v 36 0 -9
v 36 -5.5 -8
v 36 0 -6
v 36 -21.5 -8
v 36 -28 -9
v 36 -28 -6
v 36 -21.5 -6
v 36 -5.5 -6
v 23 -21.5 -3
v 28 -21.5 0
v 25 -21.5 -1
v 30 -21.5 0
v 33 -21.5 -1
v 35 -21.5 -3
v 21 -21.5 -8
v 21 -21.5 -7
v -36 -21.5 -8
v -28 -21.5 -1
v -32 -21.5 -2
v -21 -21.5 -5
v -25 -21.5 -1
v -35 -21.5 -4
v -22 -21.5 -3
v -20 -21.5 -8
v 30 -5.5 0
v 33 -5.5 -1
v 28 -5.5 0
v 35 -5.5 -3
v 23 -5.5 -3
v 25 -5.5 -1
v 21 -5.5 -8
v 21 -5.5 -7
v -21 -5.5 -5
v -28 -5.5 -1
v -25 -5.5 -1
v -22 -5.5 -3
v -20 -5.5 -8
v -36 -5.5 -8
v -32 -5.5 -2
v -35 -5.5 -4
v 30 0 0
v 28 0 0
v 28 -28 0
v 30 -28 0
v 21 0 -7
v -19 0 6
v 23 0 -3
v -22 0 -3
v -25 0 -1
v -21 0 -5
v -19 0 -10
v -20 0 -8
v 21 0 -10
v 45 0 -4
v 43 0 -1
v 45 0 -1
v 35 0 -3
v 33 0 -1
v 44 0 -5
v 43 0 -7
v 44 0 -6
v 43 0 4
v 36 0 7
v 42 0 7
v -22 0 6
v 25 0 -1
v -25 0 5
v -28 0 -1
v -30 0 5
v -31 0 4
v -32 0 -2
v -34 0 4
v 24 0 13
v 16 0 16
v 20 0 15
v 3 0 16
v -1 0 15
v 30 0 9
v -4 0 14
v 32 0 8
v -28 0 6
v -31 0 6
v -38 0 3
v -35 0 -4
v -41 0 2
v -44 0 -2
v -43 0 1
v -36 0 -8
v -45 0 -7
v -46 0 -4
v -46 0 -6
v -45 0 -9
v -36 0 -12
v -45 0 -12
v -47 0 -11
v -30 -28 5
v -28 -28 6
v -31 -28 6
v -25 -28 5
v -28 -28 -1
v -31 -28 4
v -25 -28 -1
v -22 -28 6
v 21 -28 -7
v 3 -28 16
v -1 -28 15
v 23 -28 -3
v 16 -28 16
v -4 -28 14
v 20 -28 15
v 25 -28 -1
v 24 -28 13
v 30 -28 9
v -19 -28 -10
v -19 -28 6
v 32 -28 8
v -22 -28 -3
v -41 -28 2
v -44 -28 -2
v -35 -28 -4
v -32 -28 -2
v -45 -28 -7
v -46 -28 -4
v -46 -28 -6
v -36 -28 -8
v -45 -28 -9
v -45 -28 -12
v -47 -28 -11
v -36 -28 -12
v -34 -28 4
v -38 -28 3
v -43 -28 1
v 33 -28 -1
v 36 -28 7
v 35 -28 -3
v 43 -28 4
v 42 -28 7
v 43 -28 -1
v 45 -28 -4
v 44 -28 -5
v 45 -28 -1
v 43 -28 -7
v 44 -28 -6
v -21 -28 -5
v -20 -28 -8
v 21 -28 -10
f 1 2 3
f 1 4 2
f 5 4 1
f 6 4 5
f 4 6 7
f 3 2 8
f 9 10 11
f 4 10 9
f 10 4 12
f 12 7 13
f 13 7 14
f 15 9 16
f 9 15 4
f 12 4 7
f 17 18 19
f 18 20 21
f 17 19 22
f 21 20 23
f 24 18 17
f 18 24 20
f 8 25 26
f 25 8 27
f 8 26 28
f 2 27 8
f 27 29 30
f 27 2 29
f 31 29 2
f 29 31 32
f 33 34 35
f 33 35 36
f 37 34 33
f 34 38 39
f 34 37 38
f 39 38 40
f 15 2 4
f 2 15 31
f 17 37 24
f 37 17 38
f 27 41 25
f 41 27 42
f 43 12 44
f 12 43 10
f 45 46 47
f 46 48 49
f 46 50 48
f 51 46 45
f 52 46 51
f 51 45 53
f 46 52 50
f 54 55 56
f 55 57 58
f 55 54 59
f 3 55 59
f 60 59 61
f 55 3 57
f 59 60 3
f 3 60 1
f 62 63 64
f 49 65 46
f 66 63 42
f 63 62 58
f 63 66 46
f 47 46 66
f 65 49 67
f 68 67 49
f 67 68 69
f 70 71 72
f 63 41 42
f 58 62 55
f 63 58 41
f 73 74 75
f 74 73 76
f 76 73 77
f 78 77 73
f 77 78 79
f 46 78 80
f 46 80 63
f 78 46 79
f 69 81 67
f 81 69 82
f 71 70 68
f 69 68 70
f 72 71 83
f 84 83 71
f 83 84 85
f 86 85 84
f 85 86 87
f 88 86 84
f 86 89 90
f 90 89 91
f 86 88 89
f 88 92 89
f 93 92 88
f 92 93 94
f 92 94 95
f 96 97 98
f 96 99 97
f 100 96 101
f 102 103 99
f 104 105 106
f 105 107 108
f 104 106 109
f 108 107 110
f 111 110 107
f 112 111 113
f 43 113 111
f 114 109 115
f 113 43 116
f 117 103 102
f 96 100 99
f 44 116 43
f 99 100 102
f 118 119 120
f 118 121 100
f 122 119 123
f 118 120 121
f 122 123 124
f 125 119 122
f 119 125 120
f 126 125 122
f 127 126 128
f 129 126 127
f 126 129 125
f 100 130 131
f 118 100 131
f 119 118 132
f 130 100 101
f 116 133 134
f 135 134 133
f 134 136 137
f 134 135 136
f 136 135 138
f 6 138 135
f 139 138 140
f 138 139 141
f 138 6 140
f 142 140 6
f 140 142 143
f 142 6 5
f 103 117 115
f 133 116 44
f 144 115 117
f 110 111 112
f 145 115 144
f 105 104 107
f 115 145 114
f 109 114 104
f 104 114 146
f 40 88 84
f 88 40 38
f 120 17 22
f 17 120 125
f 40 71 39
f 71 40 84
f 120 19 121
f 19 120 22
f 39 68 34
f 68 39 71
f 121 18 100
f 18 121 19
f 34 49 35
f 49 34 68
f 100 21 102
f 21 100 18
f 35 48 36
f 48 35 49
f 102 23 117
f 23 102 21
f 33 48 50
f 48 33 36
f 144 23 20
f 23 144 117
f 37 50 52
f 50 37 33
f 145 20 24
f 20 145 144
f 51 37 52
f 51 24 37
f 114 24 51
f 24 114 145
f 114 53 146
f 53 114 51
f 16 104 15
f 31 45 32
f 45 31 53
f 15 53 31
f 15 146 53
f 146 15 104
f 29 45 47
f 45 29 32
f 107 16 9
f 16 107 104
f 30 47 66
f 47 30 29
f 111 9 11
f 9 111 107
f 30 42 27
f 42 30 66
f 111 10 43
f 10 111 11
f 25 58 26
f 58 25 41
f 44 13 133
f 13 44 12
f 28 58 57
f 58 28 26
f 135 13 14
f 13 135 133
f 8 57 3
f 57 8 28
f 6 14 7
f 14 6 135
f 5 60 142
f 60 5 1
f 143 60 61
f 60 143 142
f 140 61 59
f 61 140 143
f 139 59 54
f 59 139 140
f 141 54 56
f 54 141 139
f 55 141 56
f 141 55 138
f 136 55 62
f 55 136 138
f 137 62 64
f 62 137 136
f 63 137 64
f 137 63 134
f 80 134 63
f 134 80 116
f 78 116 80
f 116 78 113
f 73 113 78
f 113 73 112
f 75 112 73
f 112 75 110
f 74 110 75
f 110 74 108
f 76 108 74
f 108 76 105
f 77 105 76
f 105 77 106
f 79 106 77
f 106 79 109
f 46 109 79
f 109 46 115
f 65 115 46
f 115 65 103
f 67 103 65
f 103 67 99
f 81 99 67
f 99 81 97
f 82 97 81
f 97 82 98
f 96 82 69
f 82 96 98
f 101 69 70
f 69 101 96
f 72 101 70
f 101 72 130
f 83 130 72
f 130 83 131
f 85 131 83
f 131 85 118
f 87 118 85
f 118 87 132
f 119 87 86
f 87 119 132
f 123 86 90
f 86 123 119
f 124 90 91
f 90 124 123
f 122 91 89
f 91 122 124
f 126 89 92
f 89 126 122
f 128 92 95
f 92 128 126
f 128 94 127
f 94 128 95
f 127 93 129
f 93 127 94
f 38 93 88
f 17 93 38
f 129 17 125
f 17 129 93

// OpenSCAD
//start
module  Rsti() 
{ 
color  ([0,0,0.2]) 
{ 
            polygon(points = [
[2.00,-19.00]
,[4.00,-18.00]
,[7.00,-17.00]
,[11.00,-16.00]
,[14.00,-16.00]
,[15.00,-15.00]
,[14.00,-14.00]
,[17.00,-14.00]
,[20.00,-15.00]
,[23.00,-14.00]
,[25.00,-14.00]
,[26.00,-14.00]
,[41.00,-6.00]
,[44.00,-5.00]
,[48.00,-4.00]
,[57.00,-4.00]
,[61.00,-4.00]
,[65.00,-5.00]
,[69.00,-7.00]
,[72.00,-9.00]
,[75.00,-11.00]
,[77.00,-12.00]
,[81.00,-13.00]
,[84.00,-13.00]
,[87.00,-13.00]
,[88.00,-16.00]
,[88.00,-19.00]
,[88.00,-21.00]
,[90.00,-21.00]
,[90.00,-24.00]
,[89.00,-25.00]
,[89.00,-26.00]
,[88.00,-27.00]
,[81.00,-29.00]
,[81.00,-26.00]
,[80.00,-23.00]
,[78.00,-21.00]
,[75.00,-20.00]
,[73.00,-20.00]
,[70.00,-21.00]
,[68.00,-23.00]
,[67.00,-25.00]
,[66.00,-27.00]
,[66.00,-29.00]
,[66.00,-30.00]
,[26.00,-30.00]
,[25.00,-28.00]
,[24.00,-25.00]
,[23.00,-23.00]
,[20.00,-21.00]
,[17.00,-21.00]
,[13.00,-22.00]
,[10.00,-24.00]
,[9.00,-28.00]
,[9.00,-32.00]
,[0.00,-32.00]
,[-2.00,-31.00]
,[-1.00,-30.00]
,[0.00,-29.00]
,[0.00,-27.00]
,[-1.00,-26.00]
,[-1.00,-24.00]
,[0.00,-23.00]
,[1.00,-22.00]
]
,paths = [
[0,1,2,3,4,5,6,7,8,9,10,11,12,13,14,15,16,17,18,19,20,21,22,23,24,25,26,27,28,29,30,31,32,33,34,35,36,37,38,39,40,41,42,43,44,45,46,47,48,49,50,51,52,53,54,55,56,57,58,59,60,61,62,63]]
            );
}
}
rotate([90,0,0]) color("black") translate([-39,-8,5.5]) cube([75,8,16]);
rotate([90,0,0]) color("red") linear_extrude(height=28) translate([-45,20,0]) Rsti();
